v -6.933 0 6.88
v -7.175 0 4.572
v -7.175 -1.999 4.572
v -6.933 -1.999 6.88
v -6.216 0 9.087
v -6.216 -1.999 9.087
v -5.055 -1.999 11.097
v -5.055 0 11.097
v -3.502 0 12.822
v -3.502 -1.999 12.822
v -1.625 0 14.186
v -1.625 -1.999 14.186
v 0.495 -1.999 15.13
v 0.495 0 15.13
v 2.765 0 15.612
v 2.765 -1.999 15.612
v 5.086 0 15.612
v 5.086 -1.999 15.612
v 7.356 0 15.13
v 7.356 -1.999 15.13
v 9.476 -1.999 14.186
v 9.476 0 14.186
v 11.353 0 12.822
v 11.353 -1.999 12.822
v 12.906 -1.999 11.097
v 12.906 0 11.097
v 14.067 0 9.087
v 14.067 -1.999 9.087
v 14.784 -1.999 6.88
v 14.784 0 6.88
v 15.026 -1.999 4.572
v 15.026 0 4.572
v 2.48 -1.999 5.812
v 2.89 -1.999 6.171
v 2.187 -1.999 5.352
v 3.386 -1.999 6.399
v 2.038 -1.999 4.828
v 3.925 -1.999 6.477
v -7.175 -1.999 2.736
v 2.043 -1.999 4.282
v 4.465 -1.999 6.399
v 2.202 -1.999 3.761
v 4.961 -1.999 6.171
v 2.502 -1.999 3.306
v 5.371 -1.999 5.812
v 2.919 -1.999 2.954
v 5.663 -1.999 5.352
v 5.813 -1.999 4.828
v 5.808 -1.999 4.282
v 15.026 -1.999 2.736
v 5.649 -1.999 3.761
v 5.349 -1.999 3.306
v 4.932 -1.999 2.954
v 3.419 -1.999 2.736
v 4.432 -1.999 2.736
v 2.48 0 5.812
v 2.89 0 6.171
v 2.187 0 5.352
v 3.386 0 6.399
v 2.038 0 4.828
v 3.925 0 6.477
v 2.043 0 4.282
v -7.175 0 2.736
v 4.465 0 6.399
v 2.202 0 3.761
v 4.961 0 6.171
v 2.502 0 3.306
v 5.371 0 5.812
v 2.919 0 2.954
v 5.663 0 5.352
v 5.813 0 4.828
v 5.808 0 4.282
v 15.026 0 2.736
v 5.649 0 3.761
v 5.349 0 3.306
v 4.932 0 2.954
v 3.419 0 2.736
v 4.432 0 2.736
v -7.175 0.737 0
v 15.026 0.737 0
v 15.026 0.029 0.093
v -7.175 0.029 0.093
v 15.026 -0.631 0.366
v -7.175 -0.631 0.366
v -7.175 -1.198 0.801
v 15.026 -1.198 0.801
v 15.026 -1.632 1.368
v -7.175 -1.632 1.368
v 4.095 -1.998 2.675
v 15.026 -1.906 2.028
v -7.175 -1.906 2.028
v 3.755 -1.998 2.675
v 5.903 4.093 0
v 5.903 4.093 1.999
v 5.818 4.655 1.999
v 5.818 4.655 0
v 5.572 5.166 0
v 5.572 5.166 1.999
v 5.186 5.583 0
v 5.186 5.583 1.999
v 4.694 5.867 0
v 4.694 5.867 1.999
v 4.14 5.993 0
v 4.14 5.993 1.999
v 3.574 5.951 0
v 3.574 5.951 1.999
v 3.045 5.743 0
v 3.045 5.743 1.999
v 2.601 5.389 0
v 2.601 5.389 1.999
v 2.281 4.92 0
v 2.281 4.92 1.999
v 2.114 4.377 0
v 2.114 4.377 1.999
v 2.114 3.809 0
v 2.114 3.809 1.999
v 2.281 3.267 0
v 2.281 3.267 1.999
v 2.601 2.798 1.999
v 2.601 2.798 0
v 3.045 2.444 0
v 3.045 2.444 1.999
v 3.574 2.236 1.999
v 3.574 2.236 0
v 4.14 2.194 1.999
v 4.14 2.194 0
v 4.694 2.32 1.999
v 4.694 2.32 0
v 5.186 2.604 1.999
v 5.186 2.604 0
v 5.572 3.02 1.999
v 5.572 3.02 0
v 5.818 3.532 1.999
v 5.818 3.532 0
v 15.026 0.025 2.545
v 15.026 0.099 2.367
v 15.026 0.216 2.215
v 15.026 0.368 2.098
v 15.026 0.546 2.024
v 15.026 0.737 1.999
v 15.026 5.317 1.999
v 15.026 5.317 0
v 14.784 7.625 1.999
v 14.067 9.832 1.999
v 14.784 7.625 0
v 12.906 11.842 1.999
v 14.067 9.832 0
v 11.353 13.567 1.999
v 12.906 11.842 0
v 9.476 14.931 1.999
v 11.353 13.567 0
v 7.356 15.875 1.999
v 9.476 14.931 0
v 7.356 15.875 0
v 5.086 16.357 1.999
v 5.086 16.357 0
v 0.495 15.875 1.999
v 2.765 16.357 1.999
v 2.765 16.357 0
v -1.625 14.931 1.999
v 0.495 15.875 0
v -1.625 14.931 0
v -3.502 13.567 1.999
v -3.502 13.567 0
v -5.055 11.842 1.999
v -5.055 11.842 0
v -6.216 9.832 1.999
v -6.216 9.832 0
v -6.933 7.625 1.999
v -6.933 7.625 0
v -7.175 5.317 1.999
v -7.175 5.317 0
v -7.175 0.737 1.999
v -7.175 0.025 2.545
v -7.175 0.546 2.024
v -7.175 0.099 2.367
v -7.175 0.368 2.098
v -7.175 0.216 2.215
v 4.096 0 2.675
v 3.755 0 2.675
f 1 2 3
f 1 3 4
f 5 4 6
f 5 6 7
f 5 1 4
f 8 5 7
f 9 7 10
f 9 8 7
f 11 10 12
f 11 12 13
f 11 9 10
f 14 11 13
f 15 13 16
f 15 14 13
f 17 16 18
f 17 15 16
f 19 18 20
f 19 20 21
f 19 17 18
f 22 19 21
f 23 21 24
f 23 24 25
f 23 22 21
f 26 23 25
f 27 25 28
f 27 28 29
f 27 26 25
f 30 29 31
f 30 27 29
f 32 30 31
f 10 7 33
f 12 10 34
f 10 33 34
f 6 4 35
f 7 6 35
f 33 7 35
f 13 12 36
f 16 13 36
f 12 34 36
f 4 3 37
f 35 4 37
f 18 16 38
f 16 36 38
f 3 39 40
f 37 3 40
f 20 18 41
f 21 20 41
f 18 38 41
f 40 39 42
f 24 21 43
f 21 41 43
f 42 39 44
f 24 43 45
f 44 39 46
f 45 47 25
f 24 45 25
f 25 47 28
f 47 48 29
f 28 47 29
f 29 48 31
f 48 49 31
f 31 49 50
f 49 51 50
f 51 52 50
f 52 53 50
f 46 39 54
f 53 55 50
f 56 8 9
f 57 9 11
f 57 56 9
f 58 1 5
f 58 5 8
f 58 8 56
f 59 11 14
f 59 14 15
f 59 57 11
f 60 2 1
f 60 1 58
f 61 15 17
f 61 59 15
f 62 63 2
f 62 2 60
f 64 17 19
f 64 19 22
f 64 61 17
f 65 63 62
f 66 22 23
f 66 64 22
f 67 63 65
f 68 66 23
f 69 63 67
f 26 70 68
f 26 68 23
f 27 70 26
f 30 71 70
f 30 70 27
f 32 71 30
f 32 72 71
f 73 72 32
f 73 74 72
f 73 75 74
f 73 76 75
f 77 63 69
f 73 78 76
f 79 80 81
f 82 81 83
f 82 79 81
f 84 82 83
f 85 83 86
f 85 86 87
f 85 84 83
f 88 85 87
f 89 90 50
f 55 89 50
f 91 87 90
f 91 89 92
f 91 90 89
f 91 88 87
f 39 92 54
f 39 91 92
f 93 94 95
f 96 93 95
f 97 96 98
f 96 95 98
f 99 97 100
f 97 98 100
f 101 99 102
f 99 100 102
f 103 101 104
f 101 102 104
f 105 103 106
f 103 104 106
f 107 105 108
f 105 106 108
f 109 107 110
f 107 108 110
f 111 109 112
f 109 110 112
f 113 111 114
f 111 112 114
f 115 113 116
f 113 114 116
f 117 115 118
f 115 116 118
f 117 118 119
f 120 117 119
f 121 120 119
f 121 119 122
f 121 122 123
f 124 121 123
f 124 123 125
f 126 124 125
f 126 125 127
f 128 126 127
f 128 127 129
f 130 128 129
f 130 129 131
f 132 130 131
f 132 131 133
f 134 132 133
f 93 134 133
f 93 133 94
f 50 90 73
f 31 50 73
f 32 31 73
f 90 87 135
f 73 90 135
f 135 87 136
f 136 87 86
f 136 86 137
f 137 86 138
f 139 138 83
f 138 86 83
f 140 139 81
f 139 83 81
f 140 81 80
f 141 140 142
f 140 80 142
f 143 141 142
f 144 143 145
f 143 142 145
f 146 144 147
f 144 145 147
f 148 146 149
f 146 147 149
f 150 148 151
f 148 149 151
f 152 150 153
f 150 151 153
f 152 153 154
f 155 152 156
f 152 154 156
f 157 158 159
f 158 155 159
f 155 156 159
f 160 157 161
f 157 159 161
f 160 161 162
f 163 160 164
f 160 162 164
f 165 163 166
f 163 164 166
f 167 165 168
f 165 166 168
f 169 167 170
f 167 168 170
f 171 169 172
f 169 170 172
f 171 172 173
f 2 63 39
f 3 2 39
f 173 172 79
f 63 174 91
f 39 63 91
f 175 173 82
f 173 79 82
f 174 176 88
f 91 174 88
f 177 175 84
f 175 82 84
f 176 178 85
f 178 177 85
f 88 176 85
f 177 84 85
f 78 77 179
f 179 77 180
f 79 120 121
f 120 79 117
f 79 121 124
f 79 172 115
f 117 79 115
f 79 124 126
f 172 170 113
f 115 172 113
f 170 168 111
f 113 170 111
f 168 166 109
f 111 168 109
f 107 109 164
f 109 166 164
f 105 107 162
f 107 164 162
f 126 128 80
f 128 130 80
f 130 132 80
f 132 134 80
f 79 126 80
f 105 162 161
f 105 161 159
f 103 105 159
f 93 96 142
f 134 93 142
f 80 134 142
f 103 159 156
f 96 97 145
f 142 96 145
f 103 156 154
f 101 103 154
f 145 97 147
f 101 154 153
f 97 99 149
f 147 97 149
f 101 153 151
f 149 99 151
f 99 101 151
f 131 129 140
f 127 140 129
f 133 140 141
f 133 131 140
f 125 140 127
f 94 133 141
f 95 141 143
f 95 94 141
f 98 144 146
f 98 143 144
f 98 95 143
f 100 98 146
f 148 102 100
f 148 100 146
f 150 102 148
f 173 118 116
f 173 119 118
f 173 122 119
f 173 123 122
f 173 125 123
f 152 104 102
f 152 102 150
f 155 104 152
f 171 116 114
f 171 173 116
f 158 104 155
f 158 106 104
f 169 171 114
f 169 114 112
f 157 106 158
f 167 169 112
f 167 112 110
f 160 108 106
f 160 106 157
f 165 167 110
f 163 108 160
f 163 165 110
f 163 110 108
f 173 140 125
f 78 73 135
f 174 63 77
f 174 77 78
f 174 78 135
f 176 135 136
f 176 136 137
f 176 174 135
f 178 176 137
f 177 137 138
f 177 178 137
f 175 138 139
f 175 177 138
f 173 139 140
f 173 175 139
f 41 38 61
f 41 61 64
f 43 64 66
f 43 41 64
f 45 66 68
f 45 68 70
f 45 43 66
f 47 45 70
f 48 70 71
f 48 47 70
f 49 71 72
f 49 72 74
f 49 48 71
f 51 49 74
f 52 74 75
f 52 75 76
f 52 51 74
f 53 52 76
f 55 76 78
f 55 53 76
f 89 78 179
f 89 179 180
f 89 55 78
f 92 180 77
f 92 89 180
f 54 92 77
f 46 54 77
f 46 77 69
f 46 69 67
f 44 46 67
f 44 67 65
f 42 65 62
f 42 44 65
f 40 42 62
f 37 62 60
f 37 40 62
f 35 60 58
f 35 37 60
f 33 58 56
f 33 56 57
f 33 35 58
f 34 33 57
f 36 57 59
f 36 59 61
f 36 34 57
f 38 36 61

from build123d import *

# Parameters (mm, degrees)
BASE_FLANGE1_DEPTH       = 1.99898
SKETCHED_START           = -17
SKETCHED_BEND1_OUTLINE_W = 22.201670932
SKETCHED_BEND1_OUTLINE_H = 1.99898
SKETCHED_BEND1_DEPTH     = 17.02505456
SKETCHED_START_2         = 0.266062511
SKETCHED_BEND1_2_DEPTH   = 1.732917489
SKETCHED_BEND1_3_DEPTH   = 2.73558
SKETCHED_START_3         = -7.17537008
SKETCHED_BEND1_4_DEPTH   = 22.201670932
SKETCH21_W               = 1.905
SKETCH21_H               = 1.99898
SKETCH17_R               = 1.905
CUT_EXTRUDE4_DEPTH       = 2.54


with BuildPart() as part:
    # Base-Flange1: sheet metal written as solids
    # Sketch1 → Base-Flange1 (new body)
    with BuildSketch(Plane(origin=(0, 0, 0), x_dir=(1, 0, 0), z_dir=(0, 1, 0))):
        with BuildLine():
            Line((15.026300852, -4.572), (15.026300852, 4.572))
            ThreePointArc((15.026300852, 4.572), (3.925465386, 15.672835466), (-7.17537008, 4.572))
            Line((-7.17537008, 4.572), (-7.17537008, -4.572))
            ThreePointArc((-7.17537008, -4.572), (3.925465386, -15.672835466), (15.026300852, -4.572))
        make_face()
    extrude(amount=-BASE_FLANGE1_DEPTH)

    # Sketched Bend1: read off the stored shape, not the designer's step
    # Sketched Bend1 outline → Sketched Bend1 (cut)
    with BuildSketch(Plane.XY.offset(SKETCHED_START)):
        with Locations((3.925465386, -0.99949)):
            Rectangle(SKETCHED_BEND1_OUTLINE_W, SKETCHED_BEND1_OUTLINE_H)
    extrude(amount=SKETCHED_BEND1_DEPTH, mode=Mode.SUBTRACT)

    # Sketched Bend1 2 outline → Sketched Bend1 2 (add)
    with BuildSketch(Plane.XY.offset(SKETCHED_START_2)):
        with BuildLine():
            Line((15.026300852, 0), (15.026300852, 5.317136205))
            ThreePointArc((15.026300852, 5.317136205), (3.925465386, 16.417971671), (-7.17537008, 5.317136205))
            Line((-7.17537008, 5.317136205), (-7.17537008, 0))
            Line((-7.17537008, 0), (15.026300852, 0))
        make_face()
    extrude(amount=SKETCHED_BEND1_2_DEPTH)

    # Sketched Bend1 3 outline → Sketched Bend1 3 (add)
    with BuildSketch(Plane.XY):
        with BuildLine():
            Line((15.026300852, 0), (15.026300852, 5.317136205))
            ThreePointArc((15.026300852, 5.317136205), (3.925465386, 16.417971671), (-7.17537008, 5.317136205))
            Line((-7.17537008, 5.317136205), (-7.17537008, 0))
            Line((-7.17537008, 0), (15.026300852, 0))
        make_face()
    extrude(amount=SKETCHED_BEND1_3_DEPTH)

    # Sketched Bend1 4 outline → Sketched Bend1 4 (cut)
    with BuildSketch(Plane.YZ.offset(SKETCHED_START_3)):
        with BuildLine():
            ThreePointArc((0, 2.73558), (0.215745145, 2.214725145), (0.7366, 1.99898))
            Line((0.7366, 1.99898), (18, 1.99898))
            Line((18, 1.99898), (18, 2.73558))
            Line((18, 2.73558), (0, 2.73558))
        make_face()
        with BuildLine():
            Line((18, -2), (18, -1e-08))
            Line((18, -1e-08), (0.7366, 0))
            ThreePointArc((0.7366, 0), (-1.197747168, 0.801232832), (-1.99898, 2.73558))
            Line((-1.99898, 2.73558), (-1.99898, 0.02505456))
            Line((-1.99898, 0.02505456), (0, 0.02505456))
            Line((0, 0.02505456), (0, -2))
            Line((0, -2), (18, -2))
        make_face()
    extrude(amount=SKETCHED_BEND1_4_DEPTH, mode=Mode.SUBTRACT)

    # Sketch21 → Hole1 (revolve, cut)
    with BuildSketch(Plane(origin=(3.925465386, 0, 4.572), x_dir=(0, 0, 1), z_dir=(1, 0, 0))):
        with Locations((0.9525, 0.99949)):
            Rectangle(SKETCH21_W, SKETCH21_H)
    revolve(axis=Axis((3.925465386, -110, 4.572), (0, 1, 0)), mode=Mode.SUBTRACT)

    # Sketch17 → Cut-Extrude4 (cut)
    with BuildSketch(Plane.XY.offset(1.99898)):
        with Locations((3.997762003, 4.09330652)):
            Circle(SKETCH17_R)
    extrude(amount=-CUT_EXTRUDE4_DEPTH, mode=Mode.SUBTRACT)


solid = part.part
